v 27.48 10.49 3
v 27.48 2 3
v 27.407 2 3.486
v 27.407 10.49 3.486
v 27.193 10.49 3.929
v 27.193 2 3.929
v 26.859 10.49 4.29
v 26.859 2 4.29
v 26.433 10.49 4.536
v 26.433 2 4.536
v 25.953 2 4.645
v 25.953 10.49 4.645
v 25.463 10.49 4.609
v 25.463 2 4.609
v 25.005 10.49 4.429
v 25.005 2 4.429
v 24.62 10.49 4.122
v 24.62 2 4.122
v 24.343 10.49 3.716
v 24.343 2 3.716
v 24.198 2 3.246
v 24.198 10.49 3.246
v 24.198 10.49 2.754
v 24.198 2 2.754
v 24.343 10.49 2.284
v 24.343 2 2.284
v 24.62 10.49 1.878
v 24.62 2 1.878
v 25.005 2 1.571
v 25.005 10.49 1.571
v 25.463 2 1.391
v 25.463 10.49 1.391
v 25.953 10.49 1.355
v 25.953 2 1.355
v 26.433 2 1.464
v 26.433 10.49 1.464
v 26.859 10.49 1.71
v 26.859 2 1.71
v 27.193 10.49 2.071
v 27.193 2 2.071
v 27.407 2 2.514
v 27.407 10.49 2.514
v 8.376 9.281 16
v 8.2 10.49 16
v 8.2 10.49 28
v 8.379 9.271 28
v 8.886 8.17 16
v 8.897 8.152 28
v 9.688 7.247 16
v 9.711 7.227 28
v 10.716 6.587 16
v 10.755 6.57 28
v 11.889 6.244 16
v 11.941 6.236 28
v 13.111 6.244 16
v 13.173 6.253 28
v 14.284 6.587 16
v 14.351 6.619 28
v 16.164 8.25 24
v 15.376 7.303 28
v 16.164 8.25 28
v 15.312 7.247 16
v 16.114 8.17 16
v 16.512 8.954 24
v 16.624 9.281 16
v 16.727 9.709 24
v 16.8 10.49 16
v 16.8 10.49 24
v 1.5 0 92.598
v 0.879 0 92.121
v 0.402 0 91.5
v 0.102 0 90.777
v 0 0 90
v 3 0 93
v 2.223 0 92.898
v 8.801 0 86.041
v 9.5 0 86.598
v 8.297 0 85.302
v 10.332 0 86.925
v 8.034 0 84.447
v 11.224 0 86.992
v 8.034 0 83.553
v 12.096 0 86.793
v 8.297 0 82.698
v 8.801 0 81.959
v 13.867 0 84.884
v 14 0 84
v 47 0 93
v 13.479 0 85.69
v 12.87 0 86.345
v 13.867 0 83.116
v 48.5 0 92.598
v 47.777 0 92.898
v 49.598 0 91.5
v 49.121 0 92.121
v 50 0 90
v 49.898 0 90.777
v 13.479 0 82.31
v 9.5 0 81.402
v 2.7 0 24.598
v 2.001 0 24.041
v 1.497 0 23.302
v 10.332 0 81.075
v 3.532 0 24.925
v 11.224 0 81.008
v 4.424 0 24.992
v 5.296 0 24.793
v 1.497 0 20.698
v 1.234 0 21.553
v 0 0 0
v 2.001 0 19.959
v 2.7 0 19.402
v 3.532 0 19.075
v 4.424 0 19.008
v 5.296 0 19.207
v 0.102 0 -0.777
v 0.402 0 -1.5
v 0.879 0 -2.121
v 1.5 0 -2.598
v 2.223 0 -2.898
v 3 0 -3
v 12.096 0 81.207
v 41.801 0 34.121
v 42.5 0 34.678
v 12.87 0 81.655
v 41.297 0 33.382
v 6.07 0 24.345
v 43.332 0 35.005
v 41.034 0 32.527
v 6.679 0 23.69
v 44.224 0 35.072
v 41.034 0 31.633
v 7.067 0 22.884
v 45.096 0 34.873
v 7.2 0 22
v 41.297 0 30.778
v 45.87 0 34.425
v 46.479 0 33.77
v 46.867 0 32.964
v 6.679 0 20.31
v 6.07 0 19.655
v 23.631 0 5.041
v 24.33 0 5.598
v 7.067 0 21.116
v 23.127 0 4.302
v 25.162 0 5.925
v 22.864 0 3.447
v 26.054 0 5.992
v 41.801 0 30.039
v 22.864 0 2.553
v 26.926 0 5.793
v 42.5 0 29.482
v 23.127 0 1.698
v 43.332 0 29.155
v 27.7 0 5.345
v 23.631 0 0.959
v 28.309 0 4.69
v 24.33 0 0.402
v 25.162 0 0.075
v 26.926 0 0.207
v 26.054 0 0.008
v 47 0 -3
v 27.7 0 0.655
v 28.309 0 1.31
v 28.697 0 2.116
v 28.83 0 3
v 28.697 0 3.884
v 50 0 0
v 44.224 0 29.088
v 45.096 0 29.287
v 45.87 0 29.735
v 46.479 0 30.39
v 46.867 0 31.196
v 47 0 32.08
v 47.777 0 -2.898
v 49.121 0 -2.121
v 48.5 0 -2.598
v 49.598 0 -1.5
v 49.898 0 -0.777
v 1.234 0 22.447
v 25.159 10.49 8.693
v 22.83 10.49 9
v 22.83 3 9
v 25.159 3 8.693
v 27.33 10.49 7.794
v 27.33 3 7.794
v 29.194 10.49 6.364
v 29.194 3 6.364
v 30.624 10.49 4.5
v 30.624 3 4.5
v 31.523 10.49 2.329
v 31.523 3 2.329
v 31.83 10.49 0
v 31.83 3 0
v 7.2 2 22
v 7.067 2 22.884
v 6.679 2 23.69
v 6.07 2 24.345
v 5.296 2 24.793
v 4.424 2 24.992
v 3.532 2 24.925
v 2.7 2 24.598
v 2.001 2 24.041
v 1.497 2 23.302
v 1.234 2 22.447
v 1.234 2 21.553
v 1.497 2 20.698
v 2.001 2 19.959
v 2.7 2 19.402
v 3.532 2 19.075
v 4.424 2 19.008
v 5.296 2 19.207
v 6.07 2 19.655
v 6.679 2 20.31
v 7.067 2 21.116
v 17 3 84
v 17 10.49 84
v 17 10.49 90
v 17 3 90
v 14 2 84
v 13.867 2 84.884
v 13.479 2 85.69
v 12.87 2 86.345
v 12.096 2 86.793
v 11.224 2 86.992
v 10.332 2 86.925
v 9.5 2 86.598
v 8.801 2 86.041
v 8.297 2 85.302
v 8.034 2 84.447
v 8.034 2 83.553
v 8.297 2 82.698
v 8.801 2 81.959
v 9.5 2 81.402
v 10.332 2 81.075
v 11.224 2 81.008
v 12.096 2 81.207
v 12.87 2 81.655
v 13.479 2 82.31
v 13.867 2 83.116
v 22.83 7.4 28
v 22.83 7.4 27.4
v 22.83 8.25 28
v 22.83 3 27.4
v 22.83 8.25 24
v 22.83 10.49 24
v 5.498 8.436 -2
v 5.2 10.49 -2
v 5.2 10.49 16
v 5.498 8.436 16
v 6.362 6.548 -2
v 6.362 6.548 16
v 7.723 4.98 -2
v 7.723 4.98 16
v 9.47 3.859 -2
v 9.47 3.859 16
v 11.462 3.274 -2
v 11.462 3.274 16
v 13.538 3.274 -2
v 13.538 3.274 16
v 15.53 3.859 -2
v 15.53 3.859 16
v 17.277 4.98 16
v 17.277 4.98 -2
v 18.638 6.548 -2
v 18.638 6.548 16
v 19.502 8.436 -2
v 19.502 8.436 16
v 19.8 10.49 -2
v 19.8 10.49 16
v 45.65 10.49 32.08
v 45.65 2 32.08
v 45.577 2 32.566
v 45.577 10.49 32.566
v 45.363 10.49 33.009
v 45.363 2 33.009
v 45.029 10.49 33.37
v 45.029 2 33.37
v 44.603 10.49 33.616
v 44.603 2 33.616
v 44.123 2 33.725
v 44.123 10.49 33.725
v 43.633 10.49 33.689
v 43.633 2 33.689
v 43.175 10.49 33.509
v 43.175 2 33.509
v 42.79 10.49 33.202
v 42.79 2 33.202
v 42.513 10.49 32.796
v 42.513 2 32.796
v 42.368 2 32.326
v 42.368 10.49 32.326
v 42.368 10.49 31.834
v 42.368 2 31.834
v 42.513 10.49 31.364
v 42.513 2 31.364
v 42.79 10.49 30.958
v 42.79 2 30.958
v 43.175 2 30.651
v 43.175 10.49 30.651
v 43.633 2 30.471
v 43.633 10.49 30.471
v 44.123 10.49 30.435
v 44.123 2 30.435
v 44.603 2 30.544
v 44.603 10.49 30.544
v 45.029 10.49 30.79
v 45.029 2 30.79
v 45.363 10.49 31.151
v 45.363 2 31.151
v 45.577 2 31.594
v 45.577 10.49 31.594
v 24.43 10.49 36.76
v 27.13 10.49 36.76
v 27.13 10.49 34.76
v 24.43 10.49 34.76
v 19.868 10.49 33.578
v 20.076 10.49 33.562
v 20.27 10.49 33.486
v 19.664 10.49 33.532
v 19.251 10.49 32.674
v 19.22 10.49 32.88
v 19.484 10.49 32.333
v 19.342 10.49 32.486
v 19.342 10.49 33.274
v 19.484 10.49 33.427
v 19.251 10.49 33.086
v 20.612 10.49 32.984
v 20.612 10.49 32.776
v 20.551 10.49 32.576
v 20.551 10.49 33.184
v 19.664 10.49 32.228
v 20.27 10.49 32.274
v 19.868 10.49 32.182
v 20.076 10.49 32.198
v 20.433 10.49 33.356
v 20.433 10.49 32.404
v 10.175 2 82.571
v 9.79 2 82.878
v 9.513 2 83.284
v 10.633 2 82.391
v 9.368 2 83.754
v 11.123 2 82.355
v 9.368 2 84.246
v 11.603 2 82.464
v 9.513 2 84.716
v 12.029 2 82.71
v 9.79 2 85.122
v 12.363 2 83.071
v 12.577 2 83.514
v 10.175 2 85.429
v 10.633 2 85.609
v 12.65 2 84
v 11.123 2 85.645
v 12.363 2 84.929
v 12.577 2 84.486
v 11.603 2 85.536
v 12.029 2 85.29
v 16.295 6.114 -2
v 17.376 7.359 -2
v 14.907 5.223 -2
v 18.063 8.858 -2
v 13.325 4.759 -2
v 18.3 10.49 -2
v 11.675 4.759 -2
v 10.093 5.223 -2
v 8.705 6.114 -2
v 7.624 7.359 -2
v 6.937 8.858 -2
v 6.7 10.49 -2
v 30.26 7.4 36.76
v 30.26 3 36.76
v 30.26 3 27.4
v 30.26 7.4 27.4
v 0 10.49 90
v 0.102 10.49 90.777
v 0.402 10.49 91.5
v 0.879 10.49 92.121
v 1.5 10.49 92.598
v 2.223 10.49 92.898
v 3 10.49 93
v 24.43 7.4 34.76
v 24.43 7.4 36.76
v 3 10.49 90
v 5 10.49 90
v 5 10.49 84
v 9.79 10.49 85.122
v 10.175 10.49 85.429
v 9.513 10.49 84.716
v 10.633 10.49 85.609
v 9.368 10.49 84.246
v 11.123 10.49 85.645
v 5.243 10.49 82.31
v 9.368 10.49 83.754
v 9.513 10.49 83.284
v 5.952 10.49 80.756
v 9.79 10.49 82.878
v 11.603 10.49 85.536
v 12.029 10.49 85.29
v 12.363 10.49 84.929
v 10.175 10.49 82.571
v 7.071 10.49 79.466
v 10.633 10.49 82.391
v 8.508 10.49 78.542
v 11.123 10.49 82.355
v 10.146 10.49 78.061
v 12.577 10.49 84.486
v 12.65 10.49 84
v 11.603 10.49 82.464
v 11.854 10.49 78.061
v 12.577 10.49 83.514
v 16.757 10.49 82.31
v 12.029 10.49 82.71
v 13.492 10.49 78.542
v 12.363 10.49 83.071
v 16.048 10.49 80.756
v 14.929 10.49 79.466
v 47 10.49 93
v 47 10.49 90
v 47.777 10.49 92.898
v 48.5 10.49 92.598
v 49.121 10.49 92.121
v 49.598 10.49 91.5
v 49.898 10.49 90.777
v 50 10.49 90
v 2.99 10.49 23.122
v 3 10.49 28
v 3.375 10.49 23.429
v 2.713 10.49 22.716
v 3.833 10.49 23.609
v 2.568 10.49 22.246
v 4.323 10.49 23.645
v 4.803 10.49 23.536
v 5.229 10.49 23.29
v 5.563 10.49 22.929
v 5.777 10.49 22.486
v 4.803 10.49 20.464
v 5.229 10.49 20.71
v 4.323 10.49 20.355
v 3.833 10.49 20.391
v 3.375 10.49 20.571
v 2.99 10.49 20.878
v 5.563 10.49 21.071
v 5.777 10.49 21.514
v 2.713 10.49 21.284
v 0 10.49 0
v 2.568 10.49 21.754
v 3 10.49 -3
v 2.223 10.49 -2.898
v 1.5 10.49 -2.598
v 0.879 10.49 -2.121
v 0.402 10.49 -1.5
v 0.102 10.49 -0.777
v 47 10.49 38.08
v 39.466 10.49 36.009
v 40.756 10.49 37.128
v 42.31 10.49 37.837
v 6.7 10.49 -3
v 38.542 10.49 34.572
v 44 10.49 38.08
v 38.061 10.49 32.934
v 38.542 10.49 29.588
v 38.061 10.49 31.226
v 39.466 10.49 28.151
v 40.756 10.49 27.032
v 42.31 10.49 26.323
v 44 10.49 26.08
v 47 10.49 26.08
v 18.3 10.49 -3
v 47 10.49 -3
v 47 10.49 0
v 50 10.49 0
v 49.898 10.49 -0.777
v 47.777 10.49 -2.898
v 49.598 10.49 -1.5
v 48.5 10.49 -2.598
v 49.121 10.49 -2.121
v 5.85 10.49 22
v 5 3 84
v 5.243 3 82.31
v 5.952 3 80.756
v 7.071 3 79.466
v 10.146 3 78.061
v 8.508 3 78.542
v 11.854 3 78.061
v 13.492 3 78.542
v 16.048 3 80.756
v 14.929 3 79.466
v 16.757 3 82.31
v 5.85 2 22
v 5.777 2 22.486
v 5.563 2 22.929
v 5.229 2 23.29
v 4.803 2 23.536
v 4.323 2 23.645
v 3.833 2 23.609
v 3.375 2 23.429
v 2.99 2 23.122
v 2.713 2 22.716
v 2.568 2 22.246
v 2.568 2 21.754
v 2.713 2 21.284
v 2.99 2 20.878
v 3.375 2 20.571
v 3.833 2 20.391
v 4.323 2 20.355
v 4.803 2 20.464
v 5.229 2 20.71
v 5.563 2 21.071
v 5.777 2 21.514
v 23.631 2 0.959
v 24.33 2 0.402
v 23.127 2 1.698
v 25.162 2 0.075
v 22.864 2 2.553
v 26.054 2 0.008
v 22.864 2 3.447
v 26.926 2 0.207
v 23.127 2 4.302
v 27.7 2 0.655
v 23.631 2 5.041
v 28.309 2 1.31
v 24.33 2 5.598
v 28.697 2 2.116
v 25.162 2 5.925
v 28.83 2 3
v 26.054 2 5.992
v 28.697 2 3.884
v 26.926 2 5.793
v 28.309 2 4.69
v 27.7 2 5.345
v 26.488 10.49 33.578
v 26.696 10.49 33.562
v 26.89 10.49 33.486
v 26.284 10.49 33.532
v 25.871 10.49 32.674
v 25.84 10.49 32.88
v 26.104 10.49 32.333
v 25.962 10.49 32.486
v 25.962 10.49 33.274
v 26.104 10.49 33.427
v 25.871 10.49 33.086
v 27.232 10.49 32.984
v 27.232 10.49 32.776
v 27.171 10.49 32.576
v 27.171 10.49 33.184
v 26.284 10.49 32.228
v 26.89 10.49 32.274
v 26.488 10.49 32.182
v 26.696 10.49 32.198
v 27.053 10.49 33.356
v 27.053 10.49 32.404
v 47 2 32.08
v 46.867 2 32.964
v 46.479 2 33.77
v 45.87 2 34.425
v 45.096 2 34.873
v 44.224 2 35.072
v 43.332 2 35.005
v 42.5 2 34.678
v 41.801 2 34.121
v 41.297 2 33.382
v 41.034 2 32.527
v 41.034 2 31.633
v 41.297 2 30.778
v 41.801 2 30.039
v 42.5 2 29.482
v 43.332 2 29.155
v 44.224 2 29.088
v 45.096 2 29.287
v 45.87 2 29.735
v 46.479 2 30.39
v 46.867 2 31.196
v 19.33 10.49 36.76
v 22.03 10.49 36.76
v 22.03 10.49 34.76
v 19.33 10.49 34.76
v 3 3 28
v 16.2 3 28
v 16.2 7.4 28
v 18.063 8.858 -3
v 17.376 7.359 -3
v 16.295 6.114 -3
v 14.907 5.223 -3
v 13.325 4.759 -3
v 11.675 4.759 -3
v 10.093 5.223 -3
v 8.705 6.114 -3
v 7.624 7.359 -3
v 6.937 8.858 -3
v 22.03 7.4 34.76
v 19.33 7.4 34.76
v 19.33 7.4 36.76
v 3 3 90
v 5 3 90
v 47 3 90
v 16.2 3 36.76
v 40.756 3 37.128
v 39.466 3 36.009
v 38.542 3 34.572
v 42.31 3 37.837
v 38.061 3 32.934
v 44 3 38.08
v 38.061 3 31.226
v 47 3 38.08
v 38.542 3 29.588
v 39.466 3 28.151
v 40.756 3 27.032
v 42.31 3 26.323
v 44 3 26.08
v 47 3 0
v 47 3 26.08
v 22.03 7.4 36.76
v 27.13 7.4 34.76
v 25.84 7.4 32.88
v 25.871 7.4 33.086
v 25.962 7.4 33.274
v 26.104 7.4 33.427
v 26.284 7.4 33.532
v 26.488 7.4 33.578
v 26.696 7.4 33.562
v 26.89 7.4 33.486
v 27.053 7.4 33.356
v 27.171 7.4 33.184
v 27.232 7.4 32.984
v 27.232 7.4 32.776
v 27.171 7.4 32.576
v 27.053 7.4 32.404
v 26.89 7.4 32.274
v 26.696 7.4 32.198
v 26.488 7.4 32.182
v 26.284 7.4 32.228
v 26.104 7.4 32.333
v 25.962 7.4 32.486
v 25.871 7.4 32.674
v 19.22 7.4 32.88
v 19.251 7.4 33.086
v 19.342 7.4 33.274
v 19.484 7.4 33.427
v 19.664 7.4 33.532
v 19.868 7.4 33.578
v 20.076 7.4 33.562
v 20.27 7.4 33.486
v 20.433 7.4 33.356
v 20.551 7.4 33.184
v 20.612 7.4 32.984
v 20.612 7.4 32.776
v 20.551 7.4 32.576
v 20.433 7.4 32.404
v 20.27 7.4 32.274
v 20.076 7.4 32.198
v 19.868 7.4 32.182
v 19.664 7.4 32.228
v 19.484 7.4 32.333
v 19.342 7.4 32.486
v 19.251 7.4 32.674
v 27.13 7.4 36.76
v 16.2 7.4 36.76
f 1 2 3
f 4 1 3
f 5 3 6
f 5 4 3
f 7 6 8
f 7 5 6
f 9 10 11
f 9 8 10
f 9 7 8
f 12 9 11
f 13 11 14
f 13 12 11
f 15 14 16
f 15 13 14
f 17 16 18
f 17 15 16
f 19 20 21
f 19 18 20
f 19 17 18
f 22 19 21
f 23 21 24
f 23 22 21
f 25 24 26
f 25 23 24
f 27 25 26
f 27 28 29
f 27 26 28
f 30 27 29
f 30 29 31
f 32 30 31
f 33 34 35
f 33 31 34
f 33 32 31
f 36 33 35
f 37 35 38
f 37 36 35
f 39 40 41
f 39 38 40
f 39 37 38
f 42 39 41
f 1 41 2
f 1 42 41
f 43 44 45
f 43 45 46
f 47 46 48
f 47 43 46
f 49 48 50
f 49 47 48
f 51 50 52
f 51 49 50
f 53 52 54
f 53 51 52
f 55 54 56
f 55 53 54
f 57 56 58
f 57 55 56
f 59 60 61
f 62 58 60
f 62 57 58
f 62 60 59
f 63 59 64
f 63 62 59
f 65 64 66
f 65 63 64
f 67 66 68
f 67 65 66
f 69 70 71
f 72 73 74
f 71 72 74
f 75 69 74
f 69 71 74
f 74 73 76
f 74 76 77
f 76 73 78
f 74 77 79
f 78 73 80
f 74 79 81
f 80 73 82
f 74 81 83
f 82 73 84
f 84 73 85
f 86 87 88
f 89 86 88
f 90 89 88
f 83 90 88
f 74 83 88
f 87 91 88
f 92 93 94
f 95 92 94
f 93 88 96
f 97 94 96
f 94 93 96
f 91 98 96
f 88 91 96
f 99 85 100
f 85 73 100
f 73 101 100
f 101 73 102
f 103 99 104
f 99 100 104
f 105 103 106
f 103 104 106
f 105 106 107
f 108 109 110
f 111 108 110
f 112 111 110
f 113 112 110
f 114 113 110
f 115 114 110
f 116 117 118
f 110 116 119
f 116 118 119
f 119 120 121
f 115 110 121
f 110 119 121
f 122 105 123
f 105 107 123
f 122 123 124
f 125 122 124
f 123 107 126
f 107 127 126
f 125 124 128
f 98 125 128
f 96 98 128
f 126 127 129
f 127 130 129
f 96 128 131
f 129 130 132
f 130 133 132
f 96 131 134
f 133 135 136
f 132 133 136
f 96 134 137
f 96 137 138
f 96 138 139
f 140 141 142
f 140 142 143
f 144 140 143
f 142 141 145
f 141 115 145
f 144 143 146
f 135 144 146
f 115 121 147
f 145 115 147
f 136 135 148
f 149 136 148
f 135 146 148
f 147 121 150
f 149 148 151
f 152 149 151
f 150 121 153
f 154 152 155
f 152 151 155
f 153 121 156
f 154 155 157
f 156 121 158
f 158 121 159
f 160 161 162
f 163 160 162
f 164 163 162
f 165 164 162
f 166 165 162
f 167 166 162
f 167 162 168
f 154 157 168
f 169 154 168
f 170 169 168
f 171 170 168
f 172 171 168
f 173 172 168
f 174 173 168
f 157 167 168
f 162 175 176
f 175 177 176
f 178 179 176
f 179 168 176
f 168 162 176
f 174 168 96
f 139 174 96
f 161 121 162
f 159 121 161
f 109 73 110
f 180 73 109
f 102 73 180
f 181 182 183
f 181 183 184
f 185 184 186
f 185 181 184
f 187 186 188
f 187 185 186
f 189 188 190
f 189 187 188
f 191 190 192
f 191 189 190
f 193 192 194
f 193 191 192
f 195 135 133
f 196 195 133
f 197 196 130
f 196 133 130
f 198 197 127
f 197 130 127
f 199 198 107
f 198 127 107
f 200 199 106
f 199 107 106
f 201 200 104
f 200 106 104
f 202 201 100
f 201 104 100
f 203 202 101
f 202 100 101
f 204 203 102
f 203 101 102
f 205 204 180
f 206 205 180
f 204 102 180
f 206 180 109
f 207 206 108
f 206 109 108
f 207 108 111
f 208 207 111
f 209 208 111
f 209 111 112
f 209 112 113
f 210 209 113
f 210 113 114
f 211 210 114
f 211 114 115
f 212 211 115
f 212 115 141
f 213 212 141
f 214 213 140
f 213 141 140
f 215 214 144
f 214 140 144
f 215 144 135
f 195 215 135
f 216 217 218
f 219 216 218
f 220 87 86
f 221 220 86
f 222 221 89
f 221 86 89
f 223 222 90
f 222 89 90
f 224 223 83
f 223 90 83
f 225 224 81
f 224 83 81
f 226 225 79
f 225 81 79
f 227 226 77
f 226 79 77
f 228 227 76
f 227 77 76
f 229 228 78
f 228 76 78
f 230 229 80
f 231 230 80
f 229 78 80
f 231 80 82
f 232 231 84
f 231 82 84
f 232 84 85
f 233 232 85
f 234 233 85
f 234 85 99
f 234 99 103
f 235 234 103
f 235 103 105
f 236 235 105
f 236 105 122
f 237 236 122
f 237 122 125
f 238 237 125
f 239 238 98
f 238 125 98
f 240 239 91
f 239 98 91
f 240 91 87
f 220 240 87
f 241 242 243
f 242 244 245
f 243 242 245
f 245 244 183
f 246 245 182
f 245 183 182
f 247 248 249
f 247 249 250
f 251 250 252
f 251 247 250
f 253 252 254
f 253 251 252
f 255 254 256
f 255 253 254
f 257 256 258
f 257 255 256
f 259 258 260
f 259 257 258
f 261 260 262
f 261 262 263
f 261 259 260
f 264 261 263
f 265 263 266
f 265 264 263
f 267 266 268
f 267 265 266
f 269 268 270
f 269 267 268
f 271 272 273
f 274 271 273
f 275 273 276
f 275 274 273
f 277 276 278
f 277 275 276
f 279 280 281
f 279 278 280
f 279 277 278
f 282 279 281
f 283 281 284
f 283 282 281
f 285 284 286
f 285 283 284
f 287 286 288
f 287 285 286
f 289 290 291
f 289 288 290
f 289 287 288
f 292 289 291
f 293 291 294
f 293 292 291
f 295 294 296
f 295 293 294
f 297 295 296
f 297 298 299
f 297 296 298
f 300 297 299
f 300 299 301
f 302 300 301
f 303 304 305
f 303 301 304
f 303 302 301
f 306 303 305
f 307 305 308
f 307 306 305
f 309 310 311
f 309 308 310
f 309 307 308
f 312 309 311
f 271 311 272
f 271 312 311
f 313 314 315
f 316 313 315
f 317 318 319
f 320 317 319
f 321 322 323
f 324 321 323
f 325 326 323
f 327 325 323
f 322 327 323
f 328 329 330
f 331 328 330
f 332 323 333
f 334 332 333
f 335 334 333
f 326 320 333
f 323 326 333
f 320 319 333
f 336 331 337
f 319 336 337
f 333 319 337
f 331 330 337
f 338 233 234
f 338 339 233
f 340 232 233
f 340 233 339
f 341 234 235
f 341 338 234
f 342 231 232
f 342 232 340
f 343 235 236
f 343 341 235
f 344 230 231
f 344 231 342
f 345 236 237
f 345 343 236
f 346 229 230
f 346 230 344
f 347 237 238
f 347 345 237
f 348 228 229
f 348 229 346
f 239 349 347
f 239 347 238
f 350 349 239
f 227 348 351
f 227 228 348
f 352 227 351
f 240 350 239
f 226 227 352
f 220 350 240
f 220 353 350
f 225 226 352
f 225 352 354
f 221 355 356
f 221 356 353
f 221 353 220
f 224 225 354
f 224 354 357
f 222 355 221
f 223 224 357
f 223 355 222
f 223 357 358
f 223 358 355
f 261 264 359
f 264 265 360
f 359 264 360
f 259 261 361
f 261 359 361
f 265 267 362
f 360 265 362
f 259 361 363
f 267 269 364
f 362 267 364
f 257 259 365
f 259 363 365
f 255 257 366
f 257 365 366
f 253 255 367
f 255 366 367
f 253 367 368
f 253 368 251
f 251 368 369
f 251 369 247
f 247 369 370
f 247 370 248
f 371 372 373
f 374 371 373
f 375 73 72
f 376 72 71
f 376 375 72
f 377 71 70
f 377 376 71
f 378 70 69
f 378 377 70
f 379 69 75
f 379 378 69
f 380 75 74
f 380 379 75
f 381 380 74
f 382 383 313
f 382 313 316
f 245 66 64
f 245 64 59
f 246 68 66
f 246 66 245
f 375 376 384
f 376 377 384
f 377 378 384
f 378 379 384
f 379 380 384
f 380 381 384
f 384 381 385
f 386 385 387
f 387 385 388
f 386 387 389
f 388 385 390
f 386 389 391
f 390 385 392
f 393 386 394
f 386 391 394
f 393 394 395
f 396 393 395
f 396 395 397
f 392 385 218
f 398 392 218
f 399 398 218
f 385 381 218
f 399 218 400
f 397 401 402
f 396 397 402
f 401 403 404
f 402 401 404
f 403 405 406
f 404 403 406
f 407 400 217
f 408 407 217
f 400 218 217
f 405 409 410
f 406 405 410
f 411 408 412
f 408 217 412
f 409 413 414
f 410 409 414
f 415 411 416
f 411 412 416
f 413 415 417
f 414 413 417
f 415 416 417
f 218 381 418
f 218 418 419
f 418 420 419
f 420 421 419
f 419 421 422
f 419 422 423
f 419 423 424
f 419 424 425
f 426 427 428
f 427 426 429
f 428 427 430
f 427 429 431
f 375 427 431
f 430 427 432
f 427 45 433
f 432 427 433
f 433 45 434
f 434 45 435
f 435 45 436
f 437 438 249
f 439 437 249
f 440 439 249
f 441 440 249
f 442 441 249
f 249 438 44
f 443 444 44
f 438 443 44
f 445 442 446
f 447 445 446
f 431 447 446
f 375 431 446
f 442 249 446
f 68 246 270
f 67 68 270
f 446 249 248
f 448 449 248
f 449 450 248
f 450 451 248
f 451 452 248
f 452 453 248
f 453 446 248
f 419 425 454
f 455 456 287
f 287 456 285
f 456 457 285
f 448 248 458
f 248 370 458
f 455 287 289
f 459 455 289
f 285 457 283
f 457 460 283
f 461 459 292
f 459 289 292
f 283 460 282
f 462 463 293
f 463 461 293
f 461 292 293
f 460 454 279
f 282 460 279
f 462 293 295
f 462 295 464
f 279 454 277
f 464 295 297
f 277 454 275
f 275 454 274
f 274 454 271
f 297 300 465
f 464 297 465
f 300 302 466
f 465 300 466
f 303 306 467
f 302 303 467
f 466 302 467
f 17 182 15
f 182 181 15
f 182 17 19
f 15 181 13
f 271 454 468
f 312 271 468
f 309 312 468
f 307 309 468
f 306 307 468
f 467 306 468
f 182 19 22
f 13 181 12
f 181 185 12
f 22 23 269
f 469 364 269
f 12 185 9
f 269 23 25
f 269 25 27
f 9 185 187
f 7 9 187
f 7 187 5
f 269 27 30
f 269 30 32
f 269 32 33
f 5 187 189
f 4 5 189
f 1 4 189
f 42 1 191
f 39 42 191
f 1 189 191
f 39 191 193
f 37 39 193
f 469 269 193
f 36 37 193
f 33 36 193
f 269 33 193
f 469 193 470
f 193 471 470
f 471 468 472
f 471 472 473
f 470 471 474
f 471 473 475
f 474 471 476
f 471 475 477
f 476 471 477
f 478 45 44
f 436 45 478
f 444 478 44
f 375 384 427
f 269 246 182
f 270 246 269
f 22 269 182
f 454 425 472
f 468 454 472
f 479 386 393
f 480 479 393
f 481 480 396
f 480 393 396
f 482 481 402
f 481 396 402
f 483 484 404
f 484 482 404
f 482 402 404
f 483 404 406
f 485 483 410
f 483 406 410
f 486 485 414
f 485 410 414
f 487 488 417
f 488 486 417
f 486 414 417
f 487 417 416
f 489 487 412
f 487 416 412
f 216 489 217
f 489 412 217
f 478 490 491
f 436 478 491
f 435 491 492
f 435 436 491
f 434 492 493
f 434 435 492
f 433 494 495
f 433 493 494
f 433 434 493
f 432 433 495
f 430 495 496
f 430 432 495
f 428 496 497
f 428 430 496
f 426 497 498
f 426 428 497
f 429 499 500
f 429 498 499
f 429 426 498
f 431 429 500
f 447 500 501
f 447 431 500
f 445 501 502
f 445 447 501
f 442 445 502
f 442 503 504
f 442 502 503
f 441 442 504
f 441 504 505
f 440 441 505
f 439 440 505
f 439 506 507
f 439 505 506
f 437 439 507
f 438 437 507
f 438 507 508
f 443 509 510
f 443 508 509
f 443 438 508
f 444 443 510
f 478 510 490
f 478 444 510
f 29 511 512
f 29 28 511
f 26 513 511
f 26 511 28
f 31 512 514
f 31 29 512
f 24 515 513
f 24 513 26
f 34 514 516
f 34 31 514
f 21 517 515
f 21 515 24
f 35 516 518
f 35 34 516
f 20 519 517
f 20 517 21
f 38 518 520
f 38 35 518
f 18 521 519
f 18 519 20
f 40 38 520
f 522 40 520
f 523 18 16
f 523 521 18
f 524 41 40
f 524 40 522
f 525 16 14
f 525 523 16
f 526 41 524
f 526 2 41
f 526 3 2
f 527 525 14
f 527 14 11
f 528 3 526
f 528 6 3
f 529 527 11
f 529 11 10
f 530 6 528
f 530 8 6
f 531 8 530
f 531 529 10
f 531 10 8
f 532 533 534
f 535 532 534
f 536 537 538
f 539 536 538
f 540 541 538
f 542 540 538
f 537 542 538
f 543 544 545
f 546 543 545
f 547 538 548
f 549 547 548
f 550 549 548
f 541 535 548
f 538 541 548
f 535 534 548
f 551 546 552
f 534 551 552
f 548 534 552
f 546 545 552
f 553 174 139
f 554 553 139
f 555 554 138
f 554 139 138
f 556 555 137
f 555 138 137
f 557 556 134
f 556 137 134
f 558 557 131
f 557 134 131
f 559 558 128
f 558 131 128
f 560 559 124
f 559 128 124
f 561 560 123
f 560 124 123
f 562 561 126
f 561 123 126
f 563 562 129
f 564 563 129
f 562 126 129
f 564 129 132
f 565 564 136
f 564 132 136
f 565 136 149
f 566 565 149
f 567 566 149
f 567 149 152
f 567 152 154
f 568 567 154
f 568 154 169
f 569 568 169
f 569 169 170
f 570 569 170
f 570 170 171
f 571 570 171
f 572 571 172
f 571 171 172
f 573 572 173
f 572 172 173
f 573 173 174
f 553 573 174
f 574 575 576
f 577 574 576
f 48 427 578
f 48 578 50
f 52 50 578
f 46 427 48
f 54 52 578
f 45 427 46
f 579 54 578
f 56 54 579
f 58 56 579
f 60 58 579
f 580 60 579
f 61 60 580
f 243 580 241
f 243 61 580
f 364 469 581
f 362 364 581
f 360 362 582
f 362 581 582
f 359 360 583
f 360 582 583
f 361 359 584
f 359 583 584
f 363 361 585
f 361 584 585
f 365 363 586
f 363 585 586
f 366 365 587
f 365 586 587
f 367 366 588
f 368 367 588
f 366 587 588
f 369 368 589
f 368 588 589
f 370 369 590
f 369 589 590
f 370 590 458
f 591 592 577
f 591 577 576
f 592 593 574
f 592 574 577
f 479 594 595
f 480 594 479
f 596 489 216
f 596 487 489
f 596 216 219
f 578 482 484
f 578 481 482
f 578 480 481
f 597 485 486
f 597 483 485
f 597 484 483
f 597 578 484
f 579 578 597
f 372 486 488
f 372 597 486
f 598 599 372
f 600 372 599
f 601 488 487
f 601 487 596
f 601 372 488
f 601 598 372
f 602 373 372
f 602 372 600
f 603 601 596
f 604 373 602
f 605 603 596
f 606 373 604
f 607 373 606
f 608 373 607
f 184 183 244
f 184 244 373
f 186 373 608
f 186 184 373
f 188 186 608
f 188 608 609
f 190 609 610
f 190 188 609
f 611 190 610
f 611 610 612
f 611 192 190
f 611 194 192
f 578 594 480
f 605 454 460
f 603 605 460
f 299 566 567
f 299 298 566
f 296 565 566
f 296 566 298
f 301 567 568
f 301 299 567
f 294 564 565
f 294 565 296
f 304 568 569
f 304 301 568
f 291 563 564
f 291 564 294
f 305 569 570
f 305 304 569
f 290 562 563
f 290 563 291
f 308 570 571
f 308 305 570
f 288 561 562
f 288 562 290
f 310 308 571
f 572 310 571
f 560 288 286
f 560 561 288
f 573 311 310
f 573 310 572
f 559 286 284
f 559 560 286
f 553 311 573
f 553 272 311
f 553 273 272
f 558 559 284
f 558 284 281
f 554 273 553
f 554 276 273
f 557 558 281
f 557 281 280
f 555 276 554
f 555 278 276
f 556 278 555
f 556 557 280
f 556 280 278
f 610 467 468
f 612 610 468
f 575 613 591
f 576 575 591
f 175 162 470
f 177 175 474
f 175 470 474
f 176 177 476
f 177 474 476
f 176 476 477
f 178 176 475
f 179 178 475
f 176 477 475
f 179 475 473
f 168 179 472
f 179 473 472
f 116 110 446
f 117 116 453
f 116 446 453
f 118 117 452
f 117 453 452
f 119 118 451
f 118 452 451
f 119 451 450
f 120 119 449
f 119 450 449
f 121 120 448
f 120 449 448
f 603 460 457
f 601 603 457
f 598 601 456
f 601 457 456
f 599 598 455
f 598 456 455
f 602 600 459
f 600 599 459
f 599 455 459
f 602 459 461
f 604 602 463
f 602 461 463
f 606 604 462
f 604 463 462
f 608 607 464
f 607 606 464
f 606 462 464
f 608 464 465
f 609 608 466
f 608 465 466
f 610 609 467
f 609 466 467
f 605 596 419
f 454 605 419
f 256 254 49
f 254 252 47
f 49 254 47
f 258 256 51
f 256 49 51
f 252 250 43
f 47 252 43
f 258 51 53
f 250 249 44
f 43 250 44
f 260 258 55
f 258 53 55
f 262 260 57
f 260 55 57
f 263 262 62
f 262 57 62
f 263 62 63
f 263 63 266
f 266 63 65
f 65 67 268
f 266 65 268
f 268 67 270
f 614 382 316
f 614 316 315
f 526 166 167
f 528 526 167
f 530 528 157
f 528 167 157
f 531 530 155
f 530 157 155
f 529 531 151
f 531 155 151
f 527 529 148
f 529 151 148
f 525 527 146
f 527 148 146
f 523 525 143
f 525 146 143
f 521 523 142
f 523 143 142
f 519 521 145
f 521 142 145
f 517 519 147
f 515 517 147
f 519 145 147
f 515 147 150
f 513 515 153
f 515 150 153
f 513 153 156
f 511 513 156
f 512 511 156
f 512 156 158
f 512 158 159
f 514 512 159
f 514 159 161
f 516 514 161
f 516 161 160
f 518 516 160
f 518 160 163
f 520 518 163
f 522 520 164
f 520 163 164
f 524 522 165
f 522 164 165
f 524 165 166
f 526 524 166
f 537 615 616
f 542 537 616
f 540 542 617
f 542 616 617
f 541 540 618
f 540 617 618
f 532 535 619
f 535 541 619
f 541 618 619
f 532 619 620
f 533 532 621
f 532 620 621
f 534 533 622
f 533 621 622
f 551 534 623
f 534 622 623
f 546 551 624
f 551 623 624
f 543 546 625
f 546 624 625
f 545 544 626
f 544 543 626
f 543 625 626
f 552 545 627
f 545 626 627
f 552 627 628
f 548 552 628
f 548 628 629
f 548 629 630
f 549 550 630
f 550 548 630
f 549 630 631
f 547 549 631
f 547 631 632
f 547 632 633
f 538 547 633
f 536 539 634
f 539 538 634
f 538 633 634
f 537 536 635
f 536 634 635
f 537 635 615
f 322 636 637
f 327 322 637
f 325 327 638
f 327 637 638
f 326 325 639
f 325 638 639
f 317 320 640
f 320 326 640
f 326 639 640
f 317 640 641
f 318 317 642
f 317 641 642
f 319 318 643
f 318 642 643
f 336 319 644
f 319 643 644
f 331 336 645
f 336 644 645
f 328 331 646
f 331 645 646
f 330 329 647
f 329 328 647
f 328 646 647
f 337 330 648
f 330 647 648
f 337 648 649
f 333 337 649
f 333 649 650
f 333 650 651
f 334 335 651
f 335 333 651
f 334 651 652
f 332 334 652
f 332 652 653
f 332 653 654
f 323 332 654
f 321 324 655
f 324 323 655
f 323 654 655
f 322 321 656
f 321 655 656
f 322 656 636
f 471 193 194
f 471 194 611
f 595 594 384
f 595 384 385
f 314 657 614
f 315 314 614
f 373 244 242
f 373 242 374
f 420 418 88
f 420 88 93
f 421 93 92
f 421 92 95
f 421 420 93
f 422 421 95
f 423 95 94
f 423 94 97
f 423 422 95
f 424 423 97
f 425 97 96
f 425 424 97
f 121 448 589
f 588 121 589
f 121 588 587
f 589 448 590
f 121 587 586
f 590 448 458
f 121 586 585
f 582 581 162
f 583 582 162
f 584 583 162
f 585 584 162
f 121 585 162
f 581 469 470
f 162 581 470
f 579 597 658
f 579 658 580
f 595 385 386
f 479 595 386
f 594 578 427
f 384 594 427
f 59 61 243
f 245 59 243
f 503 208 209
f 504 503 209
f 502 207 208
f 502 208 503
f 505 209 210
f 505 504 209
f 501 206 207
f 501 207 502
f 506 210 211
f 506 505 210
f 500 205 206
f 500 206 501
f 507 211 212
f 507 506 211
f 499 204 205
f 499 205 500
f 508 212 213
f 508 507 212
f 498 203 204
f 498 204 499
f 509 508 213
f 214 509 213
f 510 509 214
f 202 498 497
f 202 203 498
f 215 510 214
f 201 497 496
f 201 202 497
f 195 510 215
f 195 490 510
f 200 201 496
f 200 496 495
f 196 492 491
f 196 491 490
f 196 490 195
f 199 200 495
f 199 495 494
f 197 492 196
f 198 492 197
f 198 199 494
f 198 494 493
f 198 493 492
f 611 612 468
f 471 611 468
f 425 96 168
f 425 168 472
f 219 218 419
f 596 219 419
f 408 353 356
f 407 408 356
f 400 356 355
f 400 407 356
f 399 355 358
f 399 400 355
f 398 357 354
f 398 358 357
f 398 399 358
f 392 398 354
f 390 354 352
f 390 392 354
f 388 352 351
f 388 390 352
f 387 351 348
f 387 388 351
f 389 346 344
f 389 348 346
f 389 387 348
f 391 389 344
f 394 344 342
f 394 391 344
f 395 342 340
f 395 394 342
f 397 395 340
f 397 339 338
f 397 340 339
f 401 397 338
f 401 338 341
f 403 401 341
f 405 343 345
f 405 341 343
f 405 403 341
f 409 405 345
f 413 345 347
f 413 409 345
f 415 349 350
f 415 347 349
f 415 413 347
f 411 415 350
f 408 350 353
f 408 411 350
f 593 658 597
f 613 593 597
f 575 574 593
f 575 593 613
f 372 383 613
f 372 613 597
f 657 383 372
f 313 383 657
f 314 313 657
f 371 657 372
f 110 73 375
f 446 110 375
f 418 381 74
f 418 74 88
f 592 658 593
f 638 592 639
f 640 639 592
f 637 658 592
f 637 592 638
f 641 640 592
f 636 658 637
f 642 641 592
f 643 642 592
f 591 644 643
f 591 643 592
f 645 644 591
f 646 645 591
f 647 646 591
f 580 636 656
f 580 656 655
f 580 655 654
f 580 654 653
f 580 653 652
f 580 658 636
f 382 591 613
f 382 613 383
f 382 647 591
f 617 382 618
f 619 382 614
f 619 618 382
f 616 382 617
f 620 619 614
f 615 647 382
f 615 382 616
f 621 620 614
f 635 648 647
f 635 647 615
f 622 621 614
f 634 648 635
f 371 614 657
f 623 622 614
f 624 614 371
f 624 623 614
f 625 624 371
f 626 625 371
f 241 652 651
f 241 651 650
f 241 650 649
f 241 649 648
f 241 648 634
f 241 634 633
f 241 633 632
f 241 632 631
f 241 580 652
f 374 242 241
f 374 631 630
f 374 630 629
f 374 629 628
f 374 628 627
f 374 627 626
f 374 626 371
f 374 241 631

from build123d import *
from build123d.topology import SkipClean

# Parameters (mm, degrees)
SKETCH_1_W               = 50
SKETCH_1_H               = 38
EXTRUDE_1_DEPTH          = 3
SKETCH_2_W               = 50
SKETCH_2_H               = 38
SKETCH_2_W_2             = 44
SKETCH_2_H_2             = 32
EXTRUDE_2_DEPTH          = 90
SKETCH_4_R               = 7.3
CUT_EXTRUDE_1_DEPTH      = 45.2
SKETCH_5_R               = 10.3
SKETCH_5_R_2             = 7.3
EXTRUDE_3_DEPTH          = 16
SKETCH_6_R               = 8.3
SKETCH_6_R_2             = 5.8
EXTRUDE_5_DEPTH          = 1
SKETCH_7_R               = 4.3
EXTRUDE_6_DEPTH          = 2
SKETCH_8_R               = 6.3
SKETCH_8_R_2             = 4.3
EXTRUDE_7_DEPTH          = 10
SKETCH_9_W               = 2.635644668
SKETCH_9_H               = 4.5
CUT_EXTRUDE_2_DEPTH      = 4
SKETCH_10_R              = 0.7
SKETCH_10_W              = 2.7
SKETCH_10_H              = 2
EXTRUDE_8_DEPTH          = 32
SKETCH_11_W              = 14.06
SKETCH_11_H              = 9.36
EXTRUDE_9_DEPTH          = 4.4
SKETCH_12_W              = 14.06
SKETCH_12_H              = 9.36
EXTRUDE_10_DEPTH         = 21.2
CUT_EXTRUDE_3_DEPTH      = 3
SKETCH_14_R              = 1.65
EXTRUDE_11_DEPTH         = 15.5
EXTRUDE_12_DEPTH         = 15.5
CUT_EXTRUDE_4_DEPTH      = 0.8
EXTRUDE_13_DEPTH         = 18
SKETCH_18_W              = 19.83
SKETCH_18_H              = 32
SKETCH_18_R              = 6.3
EXTRUDE_14_DEPTH         = 10
SKETCH_19_W              = 4.445486426
SKETCH_19_H              = 4.5
CUT_EXTRUDE_5_DEPTH      = 4
EXTRUDE_16_REACH         = 110.743
SKETCH_23_R              = 1.65
CUT_EXTRUDE_7_DEPTH      = 109.742815855
CUT_EXTRUDE_7_DEPTH_BACK = 109.742815855
SKETCH_25_R              = 1.65
CUT_EXTRUDE_8_DEPTH      = 24.5
SKETCH_29_W              = 50
SKETCH_29_H              = 38
EXTRUDE_17_DEPTH         = 3
FILLET_1_R               = 3
SKETCH_30_W              = 96
SKETCH_30_H              = 0.02
CUT_EXTRUDE_9_DEPTH      = 113.218536793
SKETCH_31_R              = 3
CUT_EXTRUDE_10_DEPTH     = 2


with BuildPart() as part:
    # 草图1 → 凸台-拉伸1 (new body)
    with BuildSketch(Plane.XY):
        with Locations((25, 19)):
            Rectangle(SKETCH_1_W, SKETCH_1_H)
    extrude(amount=-EXTRUDE_1_DEPTH)

    # 草图2 → 凸台-拉伸2 (add)
    with BuildSketch(Plane.XY):
        with Locations((25, 19)):
            Rectangle(SKETCH_2_W, SKETCH_2_H)
        with Locations((25, 19)):
            Rectangle(SKETCH_2_W_2, SKETCH_2_H_2, mode=Mode.SUBTRACT)
    extrude(amount=EXTRUDE_2_DEPTH)

    # 草图4 → 切除-拉伸1 (cut)
    with BuildSketch(Plane(origin=(0, 0, -3), x_dir=(-1, 0, 0), z_dir=(0, 0, -1))):
        with Locations((-12.5, 10.5)):
            Circle(SKETCH_4_R)
    extrude(amount=-CUT_EXTRUDE_1_DEPTH, mode=Mode.SUBTRACT)

    # 草图5 → 凸台-拉伸3 (add)
    with BuildSketch(Plane.XY):
        with Locations((12.5, 10.5)):
            Circle(SKETCH_5_R)
        with Locations(Location((12.5, 10.5, 0), (0, 0, 180))):
            Circle(SKETCH_5_R_2, mode=Mode.SUBTRACT)
    extrude(amount=EXTRUDE_3_DEPTH)

    # 草图6 → 凸台-拉伸5 (add)
    with BuildSketch(Plane(origin=(0, 0, -3), x_dir=(-1, 0, 0), z_dir=(0, 0, -1))):
        with Locations((-12.5, 10.5)):
            Circle(SKETCH_6_R)
        with Locations((-12.5, 10.5)):
            Circle(SKETCH_6_R_2, mode=Mode.SUBTRACT)
    extrude(amount=-EXTRUDE_5_DEPTH)

    # 草图7 → 凸台-拉伸6 (add)
    with BuildSketch(Plane.XY.offset(16)):
        with BuildLine():
            Line((5.440254962, 3), (19.559745038, 3))
            ThreePointArc((19.559745038, 3), (18.368221419, 18.964867239), (3, 14.479949748))
            Line((3, 14.479949748), (3, 6.520050252))
            ThreePointArc((3, 6.520050252), (4.035132761, 4.631778581), (5.440254962, 3))
        make_face()
        with Locations((12.5, 10.5)):
            Circle(SKETCH_7_R, mode=Mode.SUBTRACT)
    extrude(amount=EXTRUDE_6_DEPTH)

    # 草图8 → 凸台-拉伸7 (add)
    with BuildSketch(Plane.XY.offset(18)):
        with Locations((12.5, 10.5)):
            Circle(SKETCH_8_R)
        with Locations((12.5, 10.5)):
            Circle(SKETCH_8_R_2, mode=Mode.SUBTRACT)
    extrude(amount=EXTRUDE_7_DEPTH)

    # 草图9 → 切除-拉伸2 (cut)
    with BuildSketch(Plane.XY.offset(28)):
        with Locations((17.482177666, 10.5)):
            Rectangle(SKETCH_9_W, SKETCH_9_H)
    extrude(amount=-CUT_EXTRUDE_2_DEPTH, mode=Mode.SUBTRACT)

    # 草图10 → 凸台-拉伸8 (add)
    with BuildSketch(Plane(origin=(0, 3, 0), x_dir=(1, 0, 0), z_dir=(0, 1, 0))):
        with Locations(Location((19.92, -32.88, 0), (0, 0, 180))):
            Circle(SKETCH_10_R)
        with Locations(Location((26.54, -32.88, 0), (0, 0, 180))):
            Circle(SKETCH_10_R)
        with Locations((20.68, -35.76)):
            Rectangle(SKETCH_10_W, SKETCH_10_H)
        with Locations((25.78, -35.76)):
            Rectangle(SKETCH_10_W, SKETCH_10_H)
    extrude(amount=EXTRUDE_8_DEPTH)

    # 草图11 → 凸台-拉伸9 (add)
    with BuildSketch(Plane(origin=(0, 3, 0), x_dir=(1, 0, 0), z_dir=(0, 1, 0))):
        with Locations((23.23, -32.08)):
            Rectangle(SKETCH_11_W, SKETCH_11_H)
    extrude(amount=EXTRUDE_9_DEPTH)

    # 草图12 → 凸台-拉伸10 (add)
    with BuildSketch(Plane.XZ.offset(-35)):
        with Locations((23.23, 32.08)):
            Rectangle(SKETCH_12_W, SKETCH_12_H)
    extrude(amount=EXTRUDE_10_DEPTH)

    # 草图13 → 切除-拉伸3 (cut)
    with BuildSketch(Plane(origin=(0, 38, 0), x_dir=(1, 0, 0), z_dir=(0, 1, 0))):
        with BuildLine():
            Line((38.62497216, -74.195968058), (44.4, -74.195968058))
            ThreePointArc((44.4, -74.195968058), (45.107106781, -73.903074839), (45.4, -73.195968058))
            Line((45.4, -73.195968058), (45.4, -54.995968058))
            ThreePointArc((45.4, -54.995968058), (45.107106781, -54.288861277), (44.4, -53.995968058))
            Line((44.4, -53.995968058), (38.62497216, -53.995968058))
            ThreePointArc((38.62497216, -53.995968058), (12.3, -64.095968058), (38.62497216, -74.195968058))
        make_face()
    extrude(amount=-CUT_EXTRUDE_3_DEPTH, mode=Mode.SUBTRACT)

    # 草图14 → 凸台-拉伸11 (add)
    # profile 1 of 2: a face of its own
    with SkipClean():  # the faces are left unmerged after this step: merging them gives an invalid solid
        with BuildSketch(Plane.XZ.offset(-35)):
            with BuildLine():
                Line((23.9, 46.595968058), (23.9, 49.407196837))
                ThreePointArc((23.9, 49.407196837), (27.4, 48.995968058), (30.9, 49.407196837))
                Line((30.9, 49.407196837), (30.9, 46.595968058))
                ThreePointArc((30.9, 46.595968058), (27.4, 43.095968058), (23.9, 46.595968058))
            make_face()
            with Locations((27.4, 46.595968058)):
                Circle(SKETCH_14_R, mode=Mode.SUBTRACT)
        # profile 2 of 2: a face of its own
        with BuildSketch(Plane.XZ.offset(-35)):
            with BuildLine():
                Line((30.9, 81.595968058), (30.9, 78.78473928))
                ThreePointArc((30.9, 78.78473928), (27.4, 79.195968058), (23.9, 78.78473928))
                Line((23.9, 78.78473928), (23.9, 81.595968058))
                ThreePointArc((23.9, 81.595968058), (27.4, 85.095968058), (30.9, 81.595968058))
            make_face()
            with Locations(Location((27.4, 81.595968058, 0), (0, 0, 90))):
                Circle(SKETCH_14_R, mode=Mode.SUBTRACT)
        extrude(amount=EXTRUDE_11_DEPTH)

    # 草图15 → 凸台-拉伸12 (add)
    with SkipClean():  # the faces are left unmerged after this step: merging them gives an invalid solid
        with BuildSketch(Plane.XZ.offset(-35)):
            with BuildLine():
                ThreePointArc((23.9, 49.407196837), (22.109340992, 49.953163271), (20.4, 50.716506186))
                Line((20.4, 50.716506186), (20.4, 46.595968058))
                ThreePointArc((20.4, 46.595968058), (27.4, 39.595968058), (34.4, 46.595968058))
                Line((34.4, 46.595968058), (34.4, 50.716506186))
                ThreePointArc((34.4, 50.716506186), (32.690659008, 49.953163271), (30.9, 49.407196837))
                Line((30.9, 49.407196837), (30.9, 46.595968058))
                ThreePointArc((30.9, 46.595968058), (27.4, 43.095968058), (23.9, 46.595968058))
                Line((23.9, 46.595968058), (23.9, 49.407196837))
            make_face()
            with BuildLine():
                Line((20.4, 81.595968058), (20.4, 77.475429931))
                ThreePointArc((20.4, 77.475429931), (22.109340992, 78.238772846), (23.9, 78.78473928))
                Line((23.9, 78.78473928), (23.9, 81.595968058))
                ThreePointArc((23.9, 81.595968058), (27.4, 85.095968058), (30.9, 81.595968058))
                Line((30.9, 81.595968058), (30.9, 78.78473928))
                ThreePointArc((30.9, 78.78473928), (32.690659008, 78.238772846), (34.4, 77.475429931))
                Line((34.4, 77.475429931), (34.4, 81.595968058))
                ThreePointArc((34.4, 81.595968058), (27.4, 88.595968058), (20.4, 81.595968058))
            make_face()
        extrude(amount=EXTRUDE_12_DEPTH)

    # 草图16 → 切除-拉伸4 (cut)
    with SkipClean():  # the faces are left unmerged after this step: merging them gives an invalid solid
        with BuildSketch(Plane.XZ.offset(-19.5)):
            with BuildLine():
                Line((31.3, 81.595968058), (31.3, 77.229132186))
                ThreePointArc((31.3, 77.229132186), (27.4, 77.795968058), (23.5, 77.229132186))
                Line((23.5, 77.229132186), (23.5, 81.595968058))
                ThreePointArc((23.5, 81.595968058), (27.4, 85.495968058), (31.3, 81.595968058))
            make_face()
            with BuildLine():
                Line((31.3, 46.595968058), (31.3, 50.962803931))
                ThreePointArc((31.3, 50.962803931), (27.4, 50.395968058), (23.5, 50.962803931))
                Line((23.5, 50.962803931), (23.5, 46.595968058))
                ThreePointArc((23.5, 46.595968058), (27.4, 42.695968058), (31.3, 46.595968058))
            make_face()
        extrude(amount=-CUT_EXTRUDE_4_DEPTH, mode=Mode.SUBTRACT)

    # 草图17 → 凸台-拉伸13 (add)
    with SkipClean():  # the faces are left unmerged after this step: merging them gives an invalid solid
        with BuildSketch(Plane.XY):
            with BuildLine():
                Line((22.83, 3), (22.83, 10.539153682))
                Line((22.83, 10.539153682), (22.83, 35))
                Line((22.83, 35), (3, 35))
                Line((3, 35), (3, 14.479949748))
                ThreePointArc((3, 14.479949748), (18.368221419, 18.964867239), (19.559745038, 3))
                Line((19.559745038, 3), (22.83, 3))
            make_face()
            with BuildLine():
                Line((5.440254962, 3), (3, 3))
                Line((3, 3), (3, 6.520050252))
                ThreePointArc((3, 6.520050252), (4.035132761, 4.631778581), (5.440254962, 3))
            make_face()
        extrude(amount=EXTRUDE_13_DEPTH)

    # 草图18 → 凸台-拉伸14 (add)
    with SkipClean():  # the faces are left unmerged after this step: merging them gives an invalid solid
        with BuildSketch(Plane.XY.offset(18)):
            with Locations((12.915, 19)):
                Rectangle(SKETCH_18_W, SKETCH_18_H)
            with Locations((12.5, 10.5)):
                Circle(SKETCH_18_R, mode=Mode.SUBTRACT)
        extrude(amount=EXTRUDE_14_DEPTH)

    # 草图19 → 切除-拉伸5 (cut)
    with SkipClean():  # the faces are left unmerged after this step: merging them gives an invalid solid
        with BuildSketch(Plane.XY.offset(28)):
            with Locations((20.607256787, 10.5)):
                Rectangle(SKETCH_19_W, SKETCH_19_H)
        extrude(amount=-CUT_EXTRUDE_5_DEPTH, mode=Mode.SUBTRACT)

    # 草图23 → 凸台-拉伸16 (add, up to next)
    with BuildSketch(Plane.XZ.offset(-35), mode=Mode.PRIVATE) as extrude_16_sk1:
        with BuildLine():
            Line((22.83, 0), (22.83, 9))
            ThreePointArc((22.83, 9), (29.193961031, 6.363961031), (31.83, 0))
            Line((31.83, 0), (22.83, 0))
        make_face()
        with Locations(Location((25.83, 3, 0), (0, 0, 180))):
            Circle(SKETCH_23_R, mode=Mode.SUBTRACT)
    extrude_16_tool1 = extrude(extrude_16_sk1.sketch, amount=EXTRUDE_16_REACH, mode=Mode.PRIVATE) - part.part
    # 草图23 → 凸台-拉伸16 (add, up to next)
    with BuildSketch(Plane.XZ.offset(-35), mode=Mode.PRIVATE) as extrude_16_sk2:
        with BuildLine():
            Line((44, 26.08), (47, 26.08))
            Line((47, 26.08), (47, 38.08))
            Line((47, 38.08), (44, 38.08))
            ThreePointArc((44, 38.08), (38, 32.08), (44, 26.08))
        make_face()
        with Locations(Location((44, 32.08, 0), (0, 0, 180))):
            Circle(SKETCH_23_R, mode=Mode.SUBTRACT)
    extrude_16_tool2 = extrude(extrude_16_sk2.sketch, amount=EXTRUDE_16_REACH, mode=Mode.PRIVATE) - part.part
    # 草图23 → 凸台-拉伸16 (add, up to next)
    with BuildSketch(Plane.XZ.offset(-35), mode=Mode.PRIVATE) as extrude_16_sk3:
        with BuildLine():
            Line((5, 90), (5, 84))
            ThreePointArc((5, 84), (11, 78), (17, 84))
            Line((17, 84), (17, 90))
            Line((17, 90), (5, 90))
        make_face()
        with Locations(Location((11, 84, 0), (0, 0, 180))):
            Circle(SKETCH_23_R, mode=Mode.SUBTRACT)
    extrude_16_tool3 = extrude(extrude_16_sk3.sketch, amount=EXTRUDE_16_REACH, mode=Mode.PRIVATE) - part.part
    add(extrude_16_tool1.solids().sort_by_distance((27.33, 35, 0.127279))[0])
    add(extrude_16_tool2.solids().sort_by_distance((45.5, 35, 26.23))[0])
    add(extrude_16_tool3.solids().sort_by_distance((11, 35, 78.169706))[0])

    # 草图25 → 切除-拉伸7 (cut, two sides: drawn at the far end of the back side and taken through both)
    with BuildSketch(Plane.XZ.offset(-35).offset(-CUT_EXTRUDE_7_DEPTH_BACK)):
        with Locations((4.2, 22)):
            Circle(SKETCH_25_R)
        with Locations((25.83, 3)):
            Circle(SKETCH_25_R)
        with Locations((44, 32.08)):
            Circle(SKETCH_25_R)
        with Locations((11, 84)):
            Circle(SKETCH_25_R)
    extrude(amount=CUT_EXTRUDE_7_DEPTH + CUT_EXTRUDE_7_DEPTH_BACK, mode=Mode.SUBTRACT)

    # 草图26 → 切除-拉伸8 (cut)
    with SkipClean():  # the faces are left unmerged after this step: merging them gives an invalid solid
        with BuildSketch(Plane(origin=(0, 38, 0), x_dir=(1, 0, 0), z_dir=(0, 1, 0))):
            Polygon((4.2, -18.537081721), (1.201024799, -20.268540861), (1.201024799, -23.731459139), (4.2, -25.462918279), (7.198975201, -23.731459139), (7.198975201, -20.268540861), align=None)
            Polygon((25.83, -6.462918279), (28.828975201, -4.731459139), (28.828975201, -1.268540861), (25.83, 0.462918279), (22.831024799, -1.268540861), (22.831024799, -4.731459139), align=None)
            Polygon((11, -80.537081721), (8.001024799, -82.268540861), (8.001024799, -85.731459139), (11, -87.462918279), (13.998975201, -85.731459139), (13.998975201, -82.268540861), align=None)
            Polygon((44, -28.617081721), (41.001024799, -30.348540861), (41.001024799, -33.811459139), (44, -35.542918279), (46.998975201, -33.811459139), (46.998975201, -30.348540861), align=None)
        extrude(amount=-CUT_EXTRUDE_8_DEPTH, mode=Mode.SUBTRACT)

    # 草图29 → 凸台-拉伸17 (add)
    with SkipClean():  # the faces are left unmerged after this step: merging them gives an invalid solid
        with BuildSketch(Plane.XY.offset(90)):
            with Locations((25, 19)):
                Rectangle(SKETCH_29_W, SKETCH_29_H)
        extrude(amount=EXTRUDE_17_DEPTH)

    # 圆角1
    fillet_1_edges = [part.edges().sort_by_distance(p)[0] for p in [
        (0, 19, -3),
        (50, 19, -3),
        (0, 19, 93),
        (50, 19, 93),
    ]]
    fillet(fillet_1_edges, radius=FILLET_1_R - 0.0001)  # a hair under: the kernel refuses the full size

    # 草图30 → 切除-拉伸9 (cut, through all)
    with BuildSketch(Plane(origin=(50, 0, 0), x_dir=(0, 0, -1), z_dir=(1, 0, 0))):
        with Locations((-45, 10.5)):
            Rectangle(SKETCH_30_W, SKETCH_30_H)
    extrude(amount=-CUT_EXTRUDE_9_DEPTH, mode=Mode.SUBTRACT)


with BuildPart() as cut_extrude_9_piece_1:
    # of the separate pieces the step leaves, piece 1, a body of its own (cut_extrude_9_pieces)
    add(part.part.solids().sort_by_distance((47.0001, 38, -3))[0])


with BuildPart() as cut_extrude_9_piece_2:
    # of the separate pieces the step leaves, piece 2, a body of its own (cut_extrude_9_pieces)
    add(part.part.solids().sort_by_distance((47.0001, 0, -3))[0])

    # 草图31 → 切除-拉伸10 (cut)
    with BuildSketch(Plane.XZ):
        with Locations((4.2, 22)):
            Circle(SKETCH_31_R)
        with Locations((25.83, 3)):
            Circle(SKETCH_31_R)
        with Locations((11, 84)):
            Circle(SKETCH_31_R)
        with Locations((44, 32.08)):
            Circle(SKETCH_31_R)
    extrude(amount=-CUT_EXTRUDE_10_DEPTH, mode=Mode.SUBTRACT)


solid = cut_extrude_9_piece_2.part
